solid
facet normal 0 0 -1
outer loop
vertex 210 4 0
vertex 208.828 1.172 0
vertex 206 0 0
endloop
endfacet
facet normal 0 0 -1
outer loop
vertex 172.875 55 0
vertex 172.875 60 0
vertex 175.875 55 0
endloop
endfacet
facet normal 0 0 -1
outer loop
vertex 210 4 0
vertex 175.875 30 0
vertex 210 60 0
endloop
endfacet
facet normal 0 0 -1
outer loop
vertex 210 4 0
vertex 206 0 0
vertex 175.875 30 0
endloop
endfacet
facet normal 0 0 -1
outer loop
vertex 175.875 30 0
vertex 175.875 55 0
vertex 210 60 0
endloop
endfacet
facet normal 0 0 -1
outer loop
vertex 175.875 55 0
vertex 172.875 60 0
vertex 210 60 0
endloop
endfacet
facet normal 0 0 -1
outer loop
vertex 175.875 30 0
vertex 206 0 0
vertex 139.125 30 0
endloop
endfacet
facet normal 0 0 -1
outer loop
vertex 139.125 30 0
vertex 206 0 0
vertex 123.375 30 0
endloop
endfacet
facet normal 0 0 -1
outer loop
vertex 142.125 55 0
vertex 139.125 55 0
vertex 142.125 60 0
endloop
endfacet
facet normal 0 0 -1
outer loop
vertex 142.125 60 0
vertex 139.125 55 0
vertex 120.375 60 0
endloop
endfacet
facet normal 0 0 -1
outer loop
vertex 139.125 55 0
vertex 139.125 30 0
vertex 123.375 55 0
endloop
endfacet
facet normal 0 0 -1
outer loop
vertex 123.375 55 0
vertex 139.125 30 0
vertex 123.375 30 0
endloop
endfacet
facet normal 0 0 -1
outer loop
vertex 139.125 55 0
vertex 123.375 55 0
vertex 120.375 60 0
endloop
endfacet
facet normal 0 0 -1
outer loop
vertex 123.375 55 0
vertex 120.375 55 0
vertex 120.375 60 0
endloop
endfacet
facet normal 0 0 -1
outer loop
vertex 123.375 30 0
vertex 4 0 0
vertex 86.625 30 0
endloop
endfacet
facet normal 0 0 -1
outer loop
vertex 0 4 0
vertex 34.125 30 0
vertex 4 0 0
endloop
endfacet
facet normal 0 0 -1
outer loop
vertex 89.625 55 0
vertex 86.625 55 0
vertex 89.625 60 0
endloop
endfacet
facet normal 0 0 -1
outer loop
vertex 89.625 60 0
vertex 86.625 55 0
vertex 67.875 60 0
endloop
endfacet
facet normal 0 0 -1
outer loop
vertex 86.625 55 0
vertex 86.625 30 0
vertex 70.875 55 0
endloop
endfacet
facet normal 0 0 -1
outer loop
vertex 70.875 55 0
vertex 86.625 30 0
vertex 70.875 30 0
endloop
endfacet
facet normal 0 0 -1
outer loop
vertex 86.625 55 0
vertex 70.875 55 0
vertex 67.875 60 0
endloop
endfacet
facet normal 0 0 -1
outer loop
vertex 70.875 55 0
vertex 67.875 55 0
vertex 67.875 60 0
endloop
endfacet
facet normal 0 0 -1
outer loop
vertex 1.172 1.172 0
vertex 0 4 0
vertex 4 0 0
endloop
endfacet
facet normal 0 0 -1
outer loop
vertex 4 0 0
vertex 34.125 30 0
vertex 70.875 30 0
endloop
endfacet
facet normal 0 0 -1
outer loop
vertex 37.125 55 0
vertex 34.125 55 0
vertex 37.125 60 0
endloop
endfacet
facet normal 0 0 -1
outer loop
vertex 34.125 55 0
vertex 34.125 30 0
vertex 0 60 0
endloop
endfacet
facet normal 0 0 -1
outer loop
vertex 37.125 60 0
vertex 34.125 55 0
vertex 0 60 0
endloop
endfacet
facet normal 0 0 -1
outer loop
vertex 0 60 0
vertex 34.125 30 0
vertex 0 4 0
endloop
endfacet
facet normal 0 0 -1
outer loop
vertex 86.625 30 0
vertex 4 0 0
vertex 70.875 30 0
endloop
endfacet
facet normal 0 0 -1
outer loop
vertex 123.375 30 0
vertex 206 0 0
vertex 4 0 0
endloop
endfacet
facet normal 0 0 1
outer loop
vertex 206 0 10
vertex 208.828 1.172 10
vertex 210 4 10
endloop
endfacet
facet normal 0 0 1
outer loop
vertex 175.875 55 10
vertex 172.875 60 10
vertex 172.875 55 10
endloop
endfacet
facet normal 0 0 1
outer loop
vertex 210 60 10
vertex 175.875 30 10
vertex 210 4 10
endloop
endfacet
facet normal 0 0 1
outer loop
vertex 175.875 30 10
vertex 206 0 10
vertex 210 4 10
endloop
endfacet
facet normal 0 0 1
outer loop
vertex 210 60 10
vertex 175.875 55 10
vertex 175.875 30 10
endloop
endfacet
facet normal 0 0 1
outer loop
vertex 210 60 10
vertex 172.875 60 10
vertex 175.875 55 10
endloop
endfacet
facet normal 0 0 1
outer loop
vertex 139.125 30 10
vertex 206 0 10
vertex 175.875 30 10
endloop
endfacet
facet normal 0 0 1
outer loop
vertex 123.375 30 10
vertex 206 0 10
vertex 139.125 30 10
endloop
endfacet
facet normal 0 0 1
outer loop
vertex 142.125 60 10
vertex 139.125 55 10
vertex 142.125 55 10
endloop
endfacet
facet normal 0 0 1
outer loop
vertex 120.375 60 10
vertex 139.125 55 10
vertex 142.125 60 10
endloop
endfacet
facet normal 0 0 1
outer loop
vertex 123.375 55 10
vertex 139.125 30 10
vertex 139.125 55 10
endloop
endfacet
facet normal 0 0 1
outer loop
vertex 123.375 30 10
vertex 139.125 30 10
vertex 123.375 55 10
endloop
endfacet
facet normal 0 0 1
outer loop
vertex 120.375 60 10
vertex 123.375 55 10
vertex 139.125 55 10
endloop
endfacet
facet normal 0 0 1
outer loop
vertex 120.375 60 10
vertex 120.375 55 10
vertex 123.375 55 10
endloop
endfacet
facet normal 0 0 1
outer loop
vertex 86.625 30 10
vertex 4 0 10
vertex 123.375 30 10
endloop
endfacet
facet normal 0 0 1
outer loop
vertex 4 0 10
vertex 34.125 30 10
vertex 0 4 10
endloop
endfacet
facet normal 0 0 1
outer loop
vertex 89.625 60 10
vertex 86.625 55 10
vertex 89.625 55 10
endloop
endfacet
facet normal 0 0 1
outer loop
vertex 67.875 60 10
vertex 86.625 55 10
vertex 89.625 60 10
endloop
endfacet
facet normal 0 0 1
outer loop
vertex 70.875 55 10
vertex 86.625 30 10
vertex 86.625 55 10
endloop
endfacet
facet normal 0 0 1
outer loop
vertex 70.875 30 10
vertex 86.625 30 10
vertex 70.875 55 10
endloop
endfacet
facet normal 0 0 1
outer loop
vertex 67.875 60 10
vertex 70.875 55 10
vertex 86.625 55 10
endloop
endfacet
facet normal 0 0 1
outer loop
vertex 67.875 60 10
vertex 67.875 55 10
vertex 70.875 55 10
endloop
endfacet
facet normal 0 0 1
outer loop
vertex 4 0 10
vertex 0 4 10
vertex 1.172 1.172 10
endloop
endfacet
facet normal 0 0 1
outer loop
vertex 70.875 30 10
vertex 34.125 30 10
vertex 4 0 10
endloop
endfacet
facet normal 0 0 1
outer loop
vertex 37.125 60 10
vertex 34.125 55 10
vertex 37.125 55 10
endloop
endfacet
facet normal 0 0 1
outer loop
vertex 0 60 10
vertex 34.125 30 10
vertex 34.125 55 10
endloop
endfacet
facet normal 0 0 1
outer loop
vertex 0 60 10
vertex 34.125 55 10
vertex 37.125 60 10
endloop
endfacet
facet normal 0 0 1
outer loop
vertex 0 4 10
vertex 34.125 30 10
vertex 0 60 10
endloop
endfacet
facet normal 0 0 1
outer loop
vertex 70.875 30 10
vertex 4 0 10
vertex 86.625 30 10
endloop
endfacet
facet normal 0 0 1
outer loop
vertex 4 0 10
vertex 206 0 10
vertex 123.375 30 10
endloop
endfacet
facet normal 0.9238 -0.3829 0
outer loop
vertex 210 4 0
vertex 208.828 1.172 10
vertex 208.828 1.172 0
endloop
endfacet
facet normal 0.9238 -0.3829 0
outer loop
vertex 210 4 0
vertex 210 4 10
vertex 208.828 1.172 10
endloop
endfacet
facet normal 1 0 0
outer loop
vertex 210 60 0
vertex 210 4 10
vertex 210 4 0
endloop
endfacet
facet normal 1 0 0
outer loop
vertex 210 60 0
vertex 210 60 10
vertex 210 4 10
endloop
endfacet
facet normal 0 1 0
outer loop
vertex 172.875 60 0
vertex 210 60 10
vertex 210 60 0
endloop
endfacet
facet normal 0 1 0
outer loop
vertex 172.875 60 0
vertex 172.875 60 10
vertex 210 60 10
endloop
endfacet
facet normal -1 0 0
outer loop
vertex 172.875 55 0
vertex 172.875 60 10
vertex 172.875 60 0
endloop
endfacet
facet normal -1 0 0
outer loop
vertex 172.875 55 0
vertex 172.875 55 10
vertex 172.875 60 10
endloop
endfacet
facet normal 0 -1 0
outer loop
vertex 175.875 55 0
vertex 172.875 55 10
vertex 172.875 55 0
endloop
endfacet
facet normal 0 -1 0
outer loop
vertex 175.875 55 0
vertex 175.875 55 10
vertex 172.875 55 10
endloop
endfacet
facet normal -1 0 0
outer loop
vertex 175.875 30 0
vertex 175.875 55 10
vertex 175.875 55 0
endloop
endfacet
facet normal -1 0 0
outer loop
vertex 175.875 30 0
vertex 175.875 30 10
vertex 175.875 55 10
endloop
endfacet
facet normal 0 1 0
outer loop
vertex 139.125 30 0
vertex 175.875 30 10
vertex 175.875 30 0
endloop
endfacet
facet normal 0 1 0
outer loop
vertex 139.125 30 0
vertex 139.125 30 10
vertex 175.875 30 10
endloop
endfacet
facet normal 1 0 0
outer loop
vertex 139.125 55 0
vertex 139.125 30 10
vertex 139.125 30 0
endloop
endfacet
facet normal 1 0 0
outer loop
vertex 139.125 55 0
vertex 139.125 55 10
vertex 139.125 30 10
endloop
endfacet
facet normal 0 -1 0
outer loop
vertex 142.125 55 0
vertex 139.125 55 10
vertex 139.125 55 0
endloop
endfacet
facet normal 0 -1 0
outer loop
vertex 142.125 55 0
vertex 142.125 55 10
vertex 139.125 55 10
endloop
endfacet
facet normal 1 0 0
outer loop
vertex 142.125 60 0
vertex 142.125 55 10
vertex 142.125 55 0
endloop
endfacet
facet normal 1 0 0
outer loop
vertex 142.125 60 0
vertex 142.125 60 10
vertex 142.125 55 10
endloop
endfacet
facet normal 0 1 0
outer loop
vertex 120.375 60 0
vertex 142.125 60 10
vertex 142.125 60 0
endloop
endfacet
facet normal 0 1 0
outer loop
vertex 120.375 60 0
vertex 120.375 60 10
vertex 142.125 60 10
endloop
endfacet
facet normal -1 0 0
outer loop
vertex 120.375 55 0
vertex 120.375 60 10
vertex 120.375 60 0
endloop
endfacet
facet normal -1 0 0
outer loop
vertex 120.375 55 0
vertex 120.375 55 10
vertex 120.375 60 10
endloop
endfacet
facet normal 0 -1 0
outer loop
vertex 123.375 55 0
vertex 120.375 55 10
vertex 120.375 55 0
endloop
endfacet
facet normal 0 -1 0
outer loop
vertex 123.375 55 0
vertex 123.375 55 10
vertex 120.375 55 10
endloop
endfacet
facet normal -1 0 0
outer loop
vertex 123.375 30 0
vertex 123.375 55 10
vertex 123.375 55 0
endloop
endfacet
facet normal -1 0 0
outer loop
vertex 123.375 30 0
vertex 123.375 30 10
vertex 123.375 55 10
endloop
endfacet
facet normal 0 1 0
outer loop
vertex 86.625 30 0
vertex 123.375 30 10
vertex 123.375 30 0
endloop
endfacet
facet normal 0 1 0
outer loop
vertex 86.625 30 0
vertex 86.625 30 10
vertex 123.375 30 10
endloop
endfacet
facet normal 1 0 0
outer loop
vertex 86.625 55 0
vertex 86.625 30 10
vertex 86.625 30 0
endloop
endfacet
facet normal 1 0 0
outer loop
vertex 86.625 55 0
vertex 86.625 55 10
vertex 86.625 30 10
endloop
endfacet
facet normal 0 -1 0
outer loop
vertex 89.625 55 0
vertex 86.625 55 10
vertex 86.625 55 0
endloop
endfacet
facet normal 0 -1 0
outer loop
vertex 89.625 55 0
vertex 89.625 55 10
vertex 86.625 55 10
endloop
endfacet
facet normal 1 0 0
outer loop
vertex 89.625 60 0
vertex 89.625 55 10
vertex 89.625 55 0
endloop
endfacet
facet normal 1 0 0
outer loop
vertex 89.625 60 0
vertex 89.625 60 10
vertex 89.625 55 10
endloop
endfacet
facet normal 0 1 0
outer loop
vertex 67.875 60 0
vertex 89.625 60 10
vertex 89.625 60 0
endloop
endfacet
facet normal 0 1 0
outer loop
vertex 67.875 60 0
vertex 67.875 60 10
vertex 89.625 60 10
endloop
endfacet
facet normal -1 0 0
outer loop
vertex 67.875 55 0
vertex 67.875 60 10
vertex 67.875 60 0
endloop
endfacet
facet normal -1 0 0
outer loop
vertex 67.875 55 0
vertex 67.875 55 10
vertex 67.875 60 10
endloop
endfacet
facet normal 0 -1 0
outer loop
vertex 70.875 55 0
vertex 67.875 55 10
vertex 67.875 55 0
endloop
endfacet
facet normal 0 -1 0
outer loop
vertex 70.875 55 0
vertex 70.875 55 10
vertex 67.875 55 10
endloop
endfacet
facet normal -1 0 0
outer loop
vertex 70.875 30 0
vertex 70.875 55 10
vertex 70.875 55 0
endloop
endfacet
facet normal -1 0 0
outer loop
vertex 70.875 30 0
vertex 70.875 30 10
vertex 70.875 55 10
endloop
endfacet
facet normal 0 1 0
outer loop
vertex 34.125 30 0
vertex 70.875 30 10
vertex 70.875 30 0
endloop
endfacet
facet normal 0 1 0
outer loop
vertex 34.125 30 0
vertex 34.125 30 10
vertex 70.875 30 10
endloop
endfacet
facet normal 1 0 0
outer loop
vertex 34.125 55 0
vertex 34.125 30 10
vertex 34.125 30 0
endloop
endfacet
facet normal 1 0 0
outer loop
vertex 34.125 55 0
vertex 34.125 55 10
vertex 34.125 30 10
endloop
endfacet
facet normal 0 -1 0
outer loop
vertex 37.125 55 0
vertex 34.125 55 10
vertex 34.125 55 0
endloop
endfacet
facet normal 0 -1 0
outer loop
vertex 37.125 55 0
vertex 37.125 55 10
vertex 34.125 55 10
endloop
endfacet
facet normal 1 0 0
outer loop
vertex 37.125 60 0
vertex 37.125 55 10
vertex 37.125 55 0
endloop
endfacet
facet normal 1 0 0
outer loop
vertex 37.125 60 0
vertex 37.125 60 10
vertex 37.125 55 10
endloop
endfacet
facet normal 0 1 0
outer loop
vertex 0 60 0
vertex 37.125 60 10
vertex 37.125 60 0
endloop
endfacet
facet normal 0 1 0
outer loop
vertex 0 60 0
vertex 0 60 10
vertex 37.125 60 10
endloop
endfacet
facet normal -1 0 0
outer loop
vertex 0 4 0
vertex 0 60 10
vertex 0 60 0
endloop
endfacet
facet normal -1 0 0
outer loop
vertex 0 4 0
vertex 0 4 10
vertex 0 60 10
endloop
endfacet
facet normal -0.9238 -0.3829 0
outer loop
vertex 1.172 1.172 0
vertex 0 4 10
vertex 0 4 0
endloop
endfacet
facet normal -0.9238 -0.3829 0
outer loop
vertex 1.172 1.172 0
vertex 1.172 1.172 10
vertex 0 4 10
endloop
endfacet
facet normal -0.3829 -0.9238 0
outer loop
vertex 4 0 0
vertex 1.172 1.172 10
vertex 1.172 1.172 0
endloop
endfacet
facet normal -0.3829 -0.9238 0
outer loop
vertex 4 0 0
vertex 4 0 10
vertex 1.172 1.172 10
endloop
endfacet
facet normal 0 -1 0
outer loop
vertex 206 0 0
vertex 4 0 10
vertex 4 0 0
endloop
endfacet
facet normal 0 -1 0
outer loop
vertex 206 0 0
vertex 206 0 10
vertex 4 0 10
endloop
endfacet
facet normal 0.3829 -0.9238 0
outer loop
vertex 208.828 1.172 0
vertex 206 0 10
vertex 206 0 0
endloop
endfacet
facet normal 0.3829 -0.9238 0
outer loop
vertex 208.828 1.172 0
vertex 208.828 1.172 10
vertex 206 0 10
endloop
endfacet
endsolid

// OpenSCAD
$fn = 32;

// ----------------------------------------------------------------------
// Oversize slot bar: 210 mm bar with 3 oversize windows
// ----------------------------------------------------------------------

// --- parameters (mm) ---
profile_height = 10;      // extrusion height
profile_points = 32;      // points of the closed outline

profile = [[0, 4], [1.172, 1.172], [4, 0], [206, 0], [208.828, 1.172], [210, 4], [210, 60], [172.875, 60], [172.875, 55], [175.875, 55], [175.875, 30], [139.125, 30], [139.125, 55], [142.125, 55], [142.125, 60], [120.375, 60], [120.375, 55], [123.375, 55], [123.375, 30], [86.625, 30], [86.625, 55], [89.625, 55], [89.625, 60], [67.875, 60], [67.875, 55], [70.875, 55], [70.875, 30], [34.125, 30], [34.125, 55], [37.125, 55], [37.125, 60], [0, 60]];  // single closed polygon, 32 points, counter clockwise

// --- the one profile operation ---
linear_extrude(height = profile_height) polygon(points = profile);
